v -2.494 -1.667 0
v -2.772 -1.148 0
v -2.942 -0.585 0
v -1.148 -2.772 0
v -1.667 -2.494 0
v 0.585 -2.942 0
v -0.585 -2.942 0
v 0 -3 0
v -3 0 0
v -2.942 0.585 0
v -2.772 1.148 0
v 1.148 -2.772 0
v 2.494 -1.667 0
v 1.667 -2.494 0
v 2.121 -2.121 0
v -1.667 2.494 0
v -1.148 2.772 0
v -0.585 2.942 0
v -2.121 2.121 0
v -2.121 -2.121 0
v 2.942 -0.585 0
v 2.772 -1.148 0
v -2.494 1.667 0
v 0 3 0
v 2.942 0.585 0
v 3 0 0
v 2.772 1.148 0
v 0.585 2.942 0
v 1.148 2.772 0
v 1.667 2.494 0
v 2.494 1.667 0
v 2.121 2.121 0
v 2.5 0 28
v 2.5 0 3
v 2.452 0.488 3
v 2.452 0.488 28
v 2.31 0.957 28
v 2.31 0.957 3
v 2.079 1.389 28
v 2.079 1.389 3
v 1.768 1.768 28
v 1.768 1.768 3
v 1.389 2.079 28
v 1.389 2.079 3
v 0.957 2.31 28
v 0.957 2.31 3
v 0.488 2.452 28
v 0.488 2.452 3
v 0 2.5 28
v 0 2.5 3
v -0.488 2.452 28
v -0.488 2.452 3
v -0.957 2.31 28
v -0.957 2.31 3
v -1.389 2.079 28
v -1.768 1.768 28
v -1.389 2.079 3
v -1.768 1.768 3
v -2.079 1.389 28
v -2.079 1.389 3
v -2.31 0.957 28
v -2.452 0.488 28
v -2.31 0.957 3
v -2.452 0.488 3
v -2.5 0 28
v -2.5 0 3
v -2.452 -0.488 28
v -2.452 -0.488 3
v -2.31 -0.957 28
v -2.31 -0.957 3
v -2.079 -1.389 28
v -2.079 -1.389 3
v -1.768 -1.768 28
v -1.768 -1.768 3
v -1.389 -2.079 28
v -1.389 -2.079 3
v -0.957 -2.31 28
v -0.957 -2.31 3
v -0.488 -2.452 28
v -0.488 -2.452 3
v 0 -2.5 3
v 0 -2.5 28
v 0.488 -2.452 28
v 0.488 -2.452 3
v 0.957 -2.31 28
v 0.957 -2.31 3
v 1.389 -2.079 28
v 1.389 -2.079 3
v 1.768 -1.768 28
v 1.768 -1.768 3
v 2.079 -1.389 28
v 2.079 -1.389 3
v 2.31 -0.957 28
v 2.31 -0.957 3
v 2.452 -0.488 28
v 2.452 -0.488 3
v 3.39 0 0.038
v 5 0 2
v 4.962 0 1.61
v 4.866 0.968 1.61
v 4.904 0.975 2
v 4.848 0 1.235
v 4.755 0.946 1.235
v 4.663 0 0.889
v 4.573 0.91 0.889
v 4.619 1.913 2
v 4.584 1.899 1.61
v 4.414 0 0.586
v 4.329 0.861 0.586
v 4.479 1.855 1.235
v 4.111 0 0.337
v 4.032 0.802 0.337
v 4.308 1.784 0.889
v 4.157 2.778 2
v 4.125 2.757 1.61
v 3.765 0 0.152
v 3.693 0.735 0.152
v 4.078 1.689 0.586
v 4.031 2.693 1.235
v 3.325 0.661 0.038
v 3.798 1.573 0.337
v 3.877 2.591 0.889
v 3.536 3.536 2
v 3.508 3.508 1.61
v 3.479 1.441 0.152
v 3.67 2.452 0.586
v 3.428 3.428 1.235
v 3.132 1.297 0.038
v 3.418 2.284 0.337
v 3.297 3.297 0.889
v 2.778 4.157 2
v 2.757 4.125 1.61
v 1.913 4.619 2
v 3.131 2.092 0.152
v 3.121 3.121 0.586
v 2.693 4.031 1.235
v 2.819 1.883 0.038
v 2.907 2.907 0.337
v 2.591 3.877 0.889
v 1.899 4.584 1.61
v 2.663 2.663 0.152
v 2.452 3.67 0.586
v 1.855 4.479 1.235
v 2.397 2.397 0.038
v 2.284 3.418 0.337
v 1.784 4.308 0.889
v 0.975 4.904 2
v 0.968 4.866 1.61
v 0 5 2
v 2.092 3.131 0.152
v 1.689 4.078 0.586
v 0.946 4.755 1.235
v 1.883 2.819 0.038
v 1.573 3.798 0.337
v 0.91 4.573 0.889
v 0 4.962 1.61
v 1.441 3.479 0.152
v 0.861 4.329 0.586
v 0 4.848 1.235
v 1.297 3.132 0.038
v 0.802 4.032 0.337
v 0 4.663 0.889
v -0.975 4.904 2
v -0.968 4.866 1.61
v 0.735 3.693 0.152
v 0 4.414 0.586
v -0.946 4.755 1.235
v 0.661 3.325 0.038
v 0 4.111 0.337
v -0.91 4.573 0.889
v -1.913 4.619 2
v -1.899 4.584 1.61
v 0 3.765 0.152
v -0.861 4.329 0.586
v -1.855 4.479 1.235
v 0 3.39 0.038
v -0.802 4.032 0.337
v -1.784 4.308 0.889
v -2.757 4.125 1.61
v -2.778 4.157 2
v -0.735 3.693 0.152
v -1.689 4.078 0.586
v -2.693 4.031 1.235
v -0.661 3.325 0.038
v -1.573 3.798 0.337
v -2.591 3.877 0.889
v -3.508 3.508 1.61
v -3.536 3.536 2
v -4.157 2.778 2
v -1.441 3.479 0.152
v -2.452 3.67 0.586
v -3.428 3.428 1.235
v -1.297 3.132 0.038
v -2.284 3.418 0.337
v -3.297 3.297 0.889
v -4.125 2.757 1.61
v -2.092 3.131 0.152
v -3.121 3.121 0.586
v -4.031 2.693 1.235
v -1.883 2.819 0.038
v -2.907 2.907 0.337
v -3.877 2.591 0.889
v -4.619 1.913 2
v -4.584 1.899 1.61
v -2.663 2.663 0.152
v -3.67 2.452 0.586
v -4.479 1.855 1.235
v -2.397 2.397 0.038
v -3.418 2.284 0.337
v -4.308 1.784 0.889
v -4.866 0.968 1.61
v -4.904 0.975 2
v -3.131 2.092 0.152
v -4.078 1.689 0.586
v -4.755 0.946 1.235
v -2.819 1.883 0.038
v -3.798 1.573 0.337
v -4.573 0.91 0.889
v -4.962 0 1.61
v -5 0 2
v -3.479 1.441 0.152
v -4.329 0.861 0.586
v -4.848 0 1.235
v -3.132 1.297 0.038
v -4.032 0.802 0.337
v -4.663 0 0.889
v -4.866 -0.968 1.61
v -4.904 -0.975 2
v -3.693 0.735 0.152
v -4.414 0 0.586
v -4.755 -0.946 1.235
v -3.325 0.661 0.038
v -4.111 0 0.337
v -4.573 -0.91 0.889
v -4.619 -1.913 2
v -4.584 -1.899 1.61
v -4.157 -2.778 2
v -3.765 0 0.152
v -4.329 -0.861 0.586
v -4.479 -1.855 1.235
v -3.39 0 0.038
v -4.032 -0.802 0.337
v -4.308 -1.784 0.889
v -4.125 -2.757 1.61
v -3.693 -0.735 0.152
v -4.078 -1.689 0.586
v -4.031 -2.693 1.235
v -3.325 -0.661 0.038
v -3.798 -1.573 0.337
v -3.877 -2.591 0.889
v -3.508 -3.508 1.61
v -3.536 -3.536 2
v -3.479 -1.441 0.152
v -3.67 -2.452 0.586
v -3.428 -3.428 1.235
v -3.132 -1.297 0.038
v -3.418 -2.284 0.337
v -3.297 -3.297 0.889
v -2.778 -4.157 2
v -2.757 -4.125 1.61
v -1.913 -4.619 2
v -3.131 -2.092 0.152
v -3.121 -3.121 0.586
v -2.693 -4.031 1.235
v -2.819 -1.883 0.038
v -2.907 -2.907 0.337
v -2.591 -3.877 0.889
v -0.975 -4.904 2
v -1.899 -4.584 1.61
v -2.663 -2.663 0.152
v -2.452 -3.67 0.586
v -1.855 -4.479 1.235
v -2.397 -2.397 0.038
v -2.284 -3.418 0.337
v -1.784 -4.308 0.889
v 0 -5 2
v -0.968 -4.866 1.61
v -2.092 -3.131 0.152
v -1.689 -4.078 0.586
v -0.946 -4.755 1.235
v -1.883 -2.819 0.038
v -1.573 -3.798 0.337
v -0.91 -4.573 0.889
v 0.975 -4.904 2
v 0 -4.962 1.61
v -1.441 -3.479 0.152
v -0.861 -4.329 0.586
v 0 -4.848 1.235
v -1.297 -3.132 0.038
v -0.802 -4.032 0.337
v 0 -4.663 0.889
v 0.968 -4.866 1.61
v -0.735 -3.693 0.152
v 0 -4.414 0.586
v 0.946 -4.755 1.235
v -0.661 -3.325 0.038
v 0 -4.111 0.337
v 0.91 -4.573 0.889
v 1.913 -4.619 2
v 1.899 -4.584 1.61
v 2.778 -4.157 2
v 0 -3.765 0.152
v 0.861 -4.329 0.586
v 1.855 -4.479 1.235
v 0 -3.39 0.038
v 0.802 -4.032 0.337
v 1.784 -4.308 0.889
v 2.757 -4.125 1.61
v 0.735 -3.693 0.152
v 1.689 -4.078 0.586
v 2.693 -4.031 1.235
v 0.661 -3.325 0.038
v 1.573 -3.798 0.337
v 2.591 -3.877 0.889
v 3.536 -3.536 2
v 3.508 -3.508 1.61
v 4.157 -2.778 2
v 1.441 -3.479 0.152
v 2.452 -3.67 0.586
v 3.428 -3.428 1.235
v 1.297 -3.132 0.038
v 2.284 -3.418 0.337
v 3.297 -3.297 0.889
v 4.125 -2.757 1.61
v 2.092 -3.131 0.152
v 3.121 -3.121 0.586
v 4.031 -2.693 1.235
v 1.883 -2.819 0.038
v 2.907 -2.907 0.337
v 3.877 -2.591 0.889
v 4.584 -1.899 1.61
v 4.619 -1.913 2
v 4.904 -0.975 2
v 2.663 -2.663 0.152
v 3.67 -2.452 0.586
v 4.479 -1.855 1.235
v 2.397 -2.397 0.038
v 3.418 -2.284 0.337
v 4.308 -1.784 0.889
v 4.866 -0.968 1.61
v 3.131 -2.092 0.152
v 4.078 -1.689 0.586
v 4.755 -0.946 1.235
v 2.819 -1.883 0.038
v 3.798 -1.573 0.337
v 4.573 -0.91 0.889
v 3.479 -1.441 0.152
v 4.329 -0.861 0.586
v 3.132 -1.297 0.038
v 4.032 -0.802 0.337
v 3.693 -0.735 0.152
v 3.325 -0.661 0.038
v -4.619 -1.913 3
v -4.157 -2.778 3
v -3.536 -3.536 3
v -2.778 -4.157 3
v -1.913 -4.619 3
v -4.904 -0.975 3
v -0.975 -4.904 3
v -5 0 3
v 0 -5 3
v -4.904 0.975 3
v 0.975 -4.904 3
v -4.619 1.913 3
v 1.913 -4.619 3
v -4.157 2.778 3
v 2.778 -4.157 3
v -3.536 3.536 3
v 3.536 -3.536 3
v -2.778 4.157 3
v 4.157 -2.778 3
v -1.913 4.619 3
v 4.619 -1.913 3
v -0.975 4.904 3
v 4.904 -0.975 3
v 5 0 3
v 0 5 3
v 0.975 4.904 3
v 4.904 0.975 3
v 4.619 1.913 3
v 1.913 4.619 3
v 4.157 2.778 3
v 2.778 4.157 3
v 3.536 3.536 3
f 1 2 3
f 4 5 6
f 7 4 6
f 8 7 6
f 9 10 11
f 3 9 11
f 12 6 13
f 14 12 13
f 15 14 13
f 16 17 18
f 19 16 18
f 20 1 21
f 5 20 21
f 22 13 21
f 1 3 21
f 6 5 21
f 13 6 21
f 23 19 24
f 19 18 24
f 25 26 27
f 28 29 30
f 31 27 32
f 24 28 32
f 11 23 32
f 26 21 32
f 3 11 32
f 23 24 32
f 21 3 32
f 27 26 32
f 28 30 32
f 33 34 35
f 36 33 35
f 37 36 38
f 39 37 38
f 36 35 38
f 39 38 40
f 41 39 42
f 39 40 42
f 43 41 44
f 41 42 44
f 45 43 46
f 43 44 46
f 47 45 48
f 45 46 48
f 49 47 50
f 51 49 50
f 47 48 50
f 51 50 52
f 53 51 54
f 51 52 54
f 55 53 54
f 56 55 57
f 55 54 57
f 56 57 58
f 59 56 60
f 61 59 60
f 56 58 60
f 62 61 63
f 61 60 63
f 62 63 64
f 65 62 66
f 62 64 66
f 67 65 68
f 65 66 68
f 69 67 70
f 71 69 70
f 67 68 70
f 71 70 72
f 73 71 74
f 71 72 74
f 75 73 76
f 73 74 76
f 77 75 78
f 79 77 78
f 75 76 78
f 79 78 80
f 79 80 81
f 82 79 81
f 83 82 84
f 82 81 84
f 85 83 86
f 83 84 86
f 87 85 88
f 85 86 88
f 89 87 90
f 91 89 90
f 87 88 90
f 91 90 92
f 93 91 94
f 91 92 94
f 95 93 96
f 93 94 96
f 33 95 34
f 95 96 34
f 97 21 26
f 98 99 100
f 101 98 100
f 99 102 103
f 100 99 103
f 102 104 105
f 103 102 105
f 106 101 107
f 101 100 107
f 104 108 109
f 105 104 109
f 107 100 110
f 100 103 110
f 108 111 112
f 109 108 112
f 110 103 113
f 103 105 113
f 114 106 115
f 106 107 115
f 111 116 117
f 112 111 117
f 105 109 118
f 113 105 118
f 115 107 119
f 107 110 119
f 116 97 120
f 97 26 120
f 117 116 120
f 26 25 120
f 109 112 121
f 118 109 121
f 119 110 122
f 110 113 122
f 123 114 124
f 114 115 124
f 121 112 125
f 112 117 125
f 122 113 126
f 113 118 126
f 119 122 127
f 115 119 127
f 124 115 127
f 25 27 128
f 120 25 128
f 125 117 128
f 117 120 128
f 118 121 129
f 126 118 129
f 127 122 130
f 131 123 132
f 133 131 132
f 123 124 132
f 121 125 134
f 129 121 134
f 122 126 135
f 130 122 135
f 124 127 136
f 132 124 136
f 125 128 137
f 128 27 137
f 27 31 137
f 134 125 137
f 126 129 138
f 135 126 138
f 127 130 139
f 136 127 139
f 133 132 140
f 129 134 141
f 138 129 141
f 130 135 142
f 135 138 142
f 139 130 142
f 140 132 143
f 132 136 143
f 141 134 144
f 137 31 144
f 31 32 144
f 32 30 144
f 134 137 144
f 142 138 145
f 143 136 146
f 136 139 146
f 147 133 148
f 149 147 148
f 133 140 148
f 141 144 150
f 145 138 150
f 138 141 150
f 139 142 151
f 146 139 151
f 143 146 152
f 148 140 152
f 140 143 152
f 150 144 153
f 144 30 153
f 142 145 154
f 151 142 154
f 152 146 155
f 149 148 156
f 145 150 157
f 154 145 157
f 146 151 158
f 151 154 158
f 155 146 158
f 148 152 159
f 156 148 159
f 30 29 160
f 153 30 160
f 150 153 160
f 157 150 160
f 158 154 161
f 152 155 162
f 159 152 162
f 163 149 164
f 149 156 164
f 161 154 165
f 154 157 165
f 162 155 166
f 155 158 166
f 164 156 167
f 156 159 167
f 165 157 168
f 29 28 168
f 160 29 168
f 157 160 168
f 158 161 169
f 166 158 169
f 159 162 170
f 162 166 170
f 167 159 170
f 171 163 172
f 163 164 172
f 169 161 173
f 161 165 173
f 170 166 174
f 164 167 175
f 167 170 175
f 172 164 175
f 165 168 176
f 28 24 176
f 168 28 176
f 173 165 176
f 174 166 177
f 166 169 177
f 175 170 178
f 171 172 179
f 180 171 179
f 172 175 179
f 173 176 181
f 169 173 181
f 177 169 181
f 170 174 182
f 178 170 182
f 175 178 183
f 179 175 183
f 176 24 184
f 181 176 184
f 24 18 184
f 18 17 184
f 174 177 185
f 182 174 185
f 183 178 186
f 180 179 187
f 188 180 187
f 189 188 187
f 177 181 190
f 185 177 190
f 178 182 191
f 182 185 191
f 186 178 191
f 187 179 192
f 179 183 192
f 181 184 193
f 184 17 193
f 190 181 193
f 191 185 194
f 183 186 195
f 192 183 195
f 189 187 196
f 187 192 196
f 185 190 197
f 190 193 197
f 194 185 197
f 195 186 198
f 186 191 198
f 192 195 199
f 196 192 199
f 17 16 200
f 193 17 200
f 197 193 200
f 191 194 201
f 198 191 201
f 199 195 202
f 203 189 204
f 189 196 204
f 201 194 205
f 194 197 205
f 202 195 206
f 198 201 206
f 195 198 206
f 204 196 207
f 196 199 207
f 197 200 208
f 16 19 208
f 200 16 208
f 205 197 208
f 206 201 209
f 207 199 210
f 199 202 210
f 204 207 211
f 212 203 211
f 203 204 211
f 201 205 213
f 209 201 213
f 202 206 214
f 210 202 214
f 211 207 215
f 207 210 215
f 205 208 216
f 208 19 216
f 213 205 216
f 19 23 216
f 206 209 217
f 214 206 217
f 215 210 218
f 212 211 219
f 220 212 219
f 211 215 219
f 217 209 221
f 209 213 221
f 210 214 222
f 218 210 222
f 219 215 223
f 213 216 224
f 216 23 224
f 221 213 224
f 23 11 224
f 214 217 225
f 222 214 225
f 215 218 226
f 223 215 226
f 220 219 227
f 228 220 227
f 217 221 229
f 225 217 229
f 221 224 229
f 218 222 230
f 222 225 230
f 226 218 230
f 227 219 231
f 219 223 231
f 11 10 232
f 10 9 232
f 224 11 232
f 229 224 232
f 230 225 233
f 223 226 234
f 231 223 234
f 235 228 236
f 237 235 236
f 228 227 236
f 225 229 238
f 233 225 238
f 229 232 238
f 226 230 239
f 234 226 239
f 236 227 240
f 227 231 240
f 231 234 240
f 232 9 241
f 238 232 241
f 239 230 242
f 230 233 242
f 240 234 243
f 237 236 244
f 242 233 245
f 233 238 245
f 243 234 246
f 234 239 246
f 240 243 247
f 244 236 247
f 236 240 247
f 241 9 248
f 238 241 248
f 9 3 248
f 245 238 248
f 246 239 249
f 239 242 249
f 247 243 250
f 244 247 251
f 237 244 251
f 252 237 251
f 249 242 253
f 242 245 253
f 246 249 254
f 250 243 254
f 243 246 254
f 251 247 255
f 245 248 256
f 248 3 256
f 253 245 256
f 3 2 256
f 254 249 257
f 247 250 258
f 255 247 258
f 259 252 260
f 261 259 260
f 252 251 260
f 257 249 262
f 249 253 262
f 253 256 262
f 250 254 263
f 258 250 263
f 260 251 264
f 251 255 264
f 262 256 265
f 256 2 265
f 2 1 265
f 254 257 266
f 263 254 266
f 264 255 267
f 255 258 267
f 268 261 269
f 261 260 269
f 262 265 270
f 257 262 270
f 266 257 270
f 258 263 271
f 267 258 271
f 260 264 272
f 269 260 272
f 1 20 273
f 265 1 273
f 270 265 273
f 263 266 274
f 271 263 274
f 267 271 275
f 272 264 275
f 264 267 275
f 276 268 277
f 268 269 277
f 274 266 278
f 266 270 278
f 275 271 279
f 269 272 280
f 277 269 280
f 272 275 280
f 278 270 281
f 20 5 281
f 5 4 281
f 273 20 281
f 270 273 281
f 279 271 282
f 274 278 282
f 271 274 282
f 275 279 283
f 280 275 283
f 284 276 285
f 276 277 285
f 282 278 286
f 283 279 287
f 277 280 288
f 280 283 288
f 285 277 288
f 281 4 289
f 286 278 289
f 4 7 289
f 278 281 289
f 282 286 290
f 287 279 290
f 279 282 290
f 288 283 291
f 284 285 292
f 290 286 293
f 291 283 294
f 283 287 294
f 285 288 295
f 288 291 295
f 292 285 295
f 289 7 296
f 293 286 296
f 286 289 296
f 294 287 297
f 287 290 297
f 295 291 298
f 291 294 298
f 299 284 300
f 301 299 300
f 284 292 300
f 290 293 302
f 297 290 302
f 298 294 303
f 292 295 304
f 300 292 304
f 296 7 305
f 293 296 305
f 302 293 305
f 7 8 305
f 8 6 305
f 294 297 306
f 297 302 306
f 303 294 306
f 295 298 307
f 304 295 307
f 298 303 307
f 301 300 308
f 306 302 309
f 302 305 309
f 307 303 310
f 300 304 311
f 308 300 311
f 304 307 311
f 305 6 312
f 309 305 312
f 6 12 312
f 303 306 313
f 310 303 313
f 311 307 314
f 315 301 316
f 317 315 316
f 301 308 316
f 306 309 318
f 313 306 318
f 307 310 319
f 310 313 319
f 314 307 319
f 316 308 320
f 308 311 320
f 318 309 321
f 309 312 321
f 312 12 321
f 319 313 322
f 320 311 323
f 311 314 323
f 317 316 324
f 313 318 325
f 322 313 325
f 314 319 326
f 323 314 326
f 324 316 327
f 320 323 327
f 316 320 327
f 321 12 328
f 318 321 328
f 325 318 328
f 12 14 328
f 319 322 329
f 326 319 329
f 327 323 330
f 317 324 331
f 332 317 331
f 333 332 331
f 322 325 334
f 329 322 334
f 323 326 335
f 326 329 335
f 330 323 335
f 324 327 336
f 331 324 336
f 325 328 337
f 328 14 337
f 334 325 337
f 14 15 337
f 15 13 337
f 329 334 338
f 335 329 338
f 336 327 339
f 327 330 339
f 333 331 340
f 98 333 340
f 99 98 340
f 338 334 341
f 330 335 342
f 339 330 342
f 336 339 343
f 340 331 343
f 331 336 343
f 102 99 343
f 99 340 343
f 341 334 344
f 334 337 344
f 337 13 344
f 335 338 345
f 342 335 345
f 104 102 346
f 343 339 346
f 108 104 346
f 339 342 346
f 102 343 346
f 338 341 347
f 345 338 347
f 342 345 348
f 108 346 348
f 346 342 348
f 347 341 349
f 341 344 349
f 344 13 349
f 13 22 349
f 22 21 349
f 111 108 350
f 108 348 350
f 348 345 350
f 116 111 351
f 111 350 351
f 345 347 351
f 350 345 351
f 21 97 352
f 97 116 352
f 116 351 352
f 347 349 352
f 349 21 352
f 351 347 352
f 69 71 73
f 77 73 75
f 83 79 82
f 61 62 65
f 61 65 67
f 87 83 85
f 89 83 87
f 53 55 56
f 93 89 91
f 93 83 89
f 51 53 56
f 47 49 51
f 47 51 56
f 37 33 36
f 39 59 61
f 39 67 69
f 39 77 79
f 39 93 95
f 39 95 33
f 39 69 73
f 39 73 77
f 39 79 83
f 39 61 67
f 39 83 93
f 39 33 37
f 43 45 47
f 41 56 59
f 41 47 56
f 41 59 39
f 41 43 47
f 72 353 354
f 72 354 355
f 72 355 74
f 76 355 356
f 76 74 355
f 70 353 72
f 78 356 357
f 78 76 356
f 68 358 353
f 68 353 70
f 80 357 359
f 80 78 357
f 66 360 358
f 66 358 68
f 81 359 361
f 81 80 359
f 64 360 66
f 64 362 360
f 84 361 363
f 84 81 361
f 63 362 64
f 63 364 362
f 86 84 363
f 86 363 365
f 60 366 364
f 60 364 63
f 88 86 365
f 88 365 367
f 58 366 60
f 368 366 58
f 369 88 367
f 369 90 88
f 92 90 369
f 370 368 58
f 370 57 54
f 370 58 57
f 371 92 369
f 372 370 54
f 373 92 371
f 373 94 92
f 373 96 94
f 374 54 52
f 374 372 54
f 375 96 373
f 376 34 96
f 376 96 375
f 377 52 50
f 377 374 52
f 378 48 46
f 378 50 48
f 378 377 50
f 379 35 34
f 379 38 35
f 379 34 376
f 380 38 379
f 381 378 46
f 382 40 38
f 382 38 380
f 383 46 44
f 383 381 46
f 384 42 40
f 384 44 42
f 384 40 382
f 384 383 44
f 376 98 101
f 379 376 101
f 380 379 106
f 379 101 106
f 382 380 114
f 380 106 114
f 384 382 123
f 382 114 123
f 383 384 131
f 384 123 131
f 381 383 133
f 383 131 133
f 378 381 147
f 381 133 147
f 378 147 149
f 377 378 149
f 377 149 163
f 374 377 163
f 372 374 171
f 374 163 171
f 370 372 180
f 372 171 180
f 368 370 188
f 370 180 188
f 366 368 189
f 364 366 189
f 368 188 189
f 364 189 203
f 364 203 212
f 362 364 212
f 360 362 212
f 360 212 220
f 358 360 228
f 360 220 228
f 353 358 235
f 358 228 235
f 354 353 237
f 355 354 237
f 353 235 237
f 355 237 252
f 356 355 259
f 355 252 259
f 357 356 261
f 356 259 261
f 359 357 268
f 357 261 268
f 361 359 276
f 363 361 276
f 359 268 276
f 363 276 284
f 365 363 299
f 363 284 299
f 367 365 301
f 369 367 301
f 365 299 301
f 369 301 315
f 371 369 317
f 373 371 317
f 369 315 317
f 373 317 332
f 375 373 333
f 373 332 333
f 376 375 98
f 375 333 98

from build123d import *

# Parameters (mm, degrees)
SKETCH_R     = 5
PAD_DEPTH    = 3
SKETCH001_R  = 2.5
PAD001_DEPTH = 25
FILLET_R     = 2


with BuildPart() as part:
    # Sketch → Pad (new body)
    with BuildSketch(Plane.XY):
        Circle(SKETCH_R)
    extrude(amount=PAD_DEPTH)

    # Sketch001 → Pad001 (new body)
    with BuildSketch(Plane.XY.offset(3)):
        Circle(SKETCH001_R)
    extrude(amount=PAD001_DEPTH)

    # Fillet
    fillet_edges = [part.edges().sort_by_distance(p)[0] for p in [
        (-5, 0, 0),
    ]]
    fillet(fillet_edges, radius=FILLET_R)


solid = part.part
